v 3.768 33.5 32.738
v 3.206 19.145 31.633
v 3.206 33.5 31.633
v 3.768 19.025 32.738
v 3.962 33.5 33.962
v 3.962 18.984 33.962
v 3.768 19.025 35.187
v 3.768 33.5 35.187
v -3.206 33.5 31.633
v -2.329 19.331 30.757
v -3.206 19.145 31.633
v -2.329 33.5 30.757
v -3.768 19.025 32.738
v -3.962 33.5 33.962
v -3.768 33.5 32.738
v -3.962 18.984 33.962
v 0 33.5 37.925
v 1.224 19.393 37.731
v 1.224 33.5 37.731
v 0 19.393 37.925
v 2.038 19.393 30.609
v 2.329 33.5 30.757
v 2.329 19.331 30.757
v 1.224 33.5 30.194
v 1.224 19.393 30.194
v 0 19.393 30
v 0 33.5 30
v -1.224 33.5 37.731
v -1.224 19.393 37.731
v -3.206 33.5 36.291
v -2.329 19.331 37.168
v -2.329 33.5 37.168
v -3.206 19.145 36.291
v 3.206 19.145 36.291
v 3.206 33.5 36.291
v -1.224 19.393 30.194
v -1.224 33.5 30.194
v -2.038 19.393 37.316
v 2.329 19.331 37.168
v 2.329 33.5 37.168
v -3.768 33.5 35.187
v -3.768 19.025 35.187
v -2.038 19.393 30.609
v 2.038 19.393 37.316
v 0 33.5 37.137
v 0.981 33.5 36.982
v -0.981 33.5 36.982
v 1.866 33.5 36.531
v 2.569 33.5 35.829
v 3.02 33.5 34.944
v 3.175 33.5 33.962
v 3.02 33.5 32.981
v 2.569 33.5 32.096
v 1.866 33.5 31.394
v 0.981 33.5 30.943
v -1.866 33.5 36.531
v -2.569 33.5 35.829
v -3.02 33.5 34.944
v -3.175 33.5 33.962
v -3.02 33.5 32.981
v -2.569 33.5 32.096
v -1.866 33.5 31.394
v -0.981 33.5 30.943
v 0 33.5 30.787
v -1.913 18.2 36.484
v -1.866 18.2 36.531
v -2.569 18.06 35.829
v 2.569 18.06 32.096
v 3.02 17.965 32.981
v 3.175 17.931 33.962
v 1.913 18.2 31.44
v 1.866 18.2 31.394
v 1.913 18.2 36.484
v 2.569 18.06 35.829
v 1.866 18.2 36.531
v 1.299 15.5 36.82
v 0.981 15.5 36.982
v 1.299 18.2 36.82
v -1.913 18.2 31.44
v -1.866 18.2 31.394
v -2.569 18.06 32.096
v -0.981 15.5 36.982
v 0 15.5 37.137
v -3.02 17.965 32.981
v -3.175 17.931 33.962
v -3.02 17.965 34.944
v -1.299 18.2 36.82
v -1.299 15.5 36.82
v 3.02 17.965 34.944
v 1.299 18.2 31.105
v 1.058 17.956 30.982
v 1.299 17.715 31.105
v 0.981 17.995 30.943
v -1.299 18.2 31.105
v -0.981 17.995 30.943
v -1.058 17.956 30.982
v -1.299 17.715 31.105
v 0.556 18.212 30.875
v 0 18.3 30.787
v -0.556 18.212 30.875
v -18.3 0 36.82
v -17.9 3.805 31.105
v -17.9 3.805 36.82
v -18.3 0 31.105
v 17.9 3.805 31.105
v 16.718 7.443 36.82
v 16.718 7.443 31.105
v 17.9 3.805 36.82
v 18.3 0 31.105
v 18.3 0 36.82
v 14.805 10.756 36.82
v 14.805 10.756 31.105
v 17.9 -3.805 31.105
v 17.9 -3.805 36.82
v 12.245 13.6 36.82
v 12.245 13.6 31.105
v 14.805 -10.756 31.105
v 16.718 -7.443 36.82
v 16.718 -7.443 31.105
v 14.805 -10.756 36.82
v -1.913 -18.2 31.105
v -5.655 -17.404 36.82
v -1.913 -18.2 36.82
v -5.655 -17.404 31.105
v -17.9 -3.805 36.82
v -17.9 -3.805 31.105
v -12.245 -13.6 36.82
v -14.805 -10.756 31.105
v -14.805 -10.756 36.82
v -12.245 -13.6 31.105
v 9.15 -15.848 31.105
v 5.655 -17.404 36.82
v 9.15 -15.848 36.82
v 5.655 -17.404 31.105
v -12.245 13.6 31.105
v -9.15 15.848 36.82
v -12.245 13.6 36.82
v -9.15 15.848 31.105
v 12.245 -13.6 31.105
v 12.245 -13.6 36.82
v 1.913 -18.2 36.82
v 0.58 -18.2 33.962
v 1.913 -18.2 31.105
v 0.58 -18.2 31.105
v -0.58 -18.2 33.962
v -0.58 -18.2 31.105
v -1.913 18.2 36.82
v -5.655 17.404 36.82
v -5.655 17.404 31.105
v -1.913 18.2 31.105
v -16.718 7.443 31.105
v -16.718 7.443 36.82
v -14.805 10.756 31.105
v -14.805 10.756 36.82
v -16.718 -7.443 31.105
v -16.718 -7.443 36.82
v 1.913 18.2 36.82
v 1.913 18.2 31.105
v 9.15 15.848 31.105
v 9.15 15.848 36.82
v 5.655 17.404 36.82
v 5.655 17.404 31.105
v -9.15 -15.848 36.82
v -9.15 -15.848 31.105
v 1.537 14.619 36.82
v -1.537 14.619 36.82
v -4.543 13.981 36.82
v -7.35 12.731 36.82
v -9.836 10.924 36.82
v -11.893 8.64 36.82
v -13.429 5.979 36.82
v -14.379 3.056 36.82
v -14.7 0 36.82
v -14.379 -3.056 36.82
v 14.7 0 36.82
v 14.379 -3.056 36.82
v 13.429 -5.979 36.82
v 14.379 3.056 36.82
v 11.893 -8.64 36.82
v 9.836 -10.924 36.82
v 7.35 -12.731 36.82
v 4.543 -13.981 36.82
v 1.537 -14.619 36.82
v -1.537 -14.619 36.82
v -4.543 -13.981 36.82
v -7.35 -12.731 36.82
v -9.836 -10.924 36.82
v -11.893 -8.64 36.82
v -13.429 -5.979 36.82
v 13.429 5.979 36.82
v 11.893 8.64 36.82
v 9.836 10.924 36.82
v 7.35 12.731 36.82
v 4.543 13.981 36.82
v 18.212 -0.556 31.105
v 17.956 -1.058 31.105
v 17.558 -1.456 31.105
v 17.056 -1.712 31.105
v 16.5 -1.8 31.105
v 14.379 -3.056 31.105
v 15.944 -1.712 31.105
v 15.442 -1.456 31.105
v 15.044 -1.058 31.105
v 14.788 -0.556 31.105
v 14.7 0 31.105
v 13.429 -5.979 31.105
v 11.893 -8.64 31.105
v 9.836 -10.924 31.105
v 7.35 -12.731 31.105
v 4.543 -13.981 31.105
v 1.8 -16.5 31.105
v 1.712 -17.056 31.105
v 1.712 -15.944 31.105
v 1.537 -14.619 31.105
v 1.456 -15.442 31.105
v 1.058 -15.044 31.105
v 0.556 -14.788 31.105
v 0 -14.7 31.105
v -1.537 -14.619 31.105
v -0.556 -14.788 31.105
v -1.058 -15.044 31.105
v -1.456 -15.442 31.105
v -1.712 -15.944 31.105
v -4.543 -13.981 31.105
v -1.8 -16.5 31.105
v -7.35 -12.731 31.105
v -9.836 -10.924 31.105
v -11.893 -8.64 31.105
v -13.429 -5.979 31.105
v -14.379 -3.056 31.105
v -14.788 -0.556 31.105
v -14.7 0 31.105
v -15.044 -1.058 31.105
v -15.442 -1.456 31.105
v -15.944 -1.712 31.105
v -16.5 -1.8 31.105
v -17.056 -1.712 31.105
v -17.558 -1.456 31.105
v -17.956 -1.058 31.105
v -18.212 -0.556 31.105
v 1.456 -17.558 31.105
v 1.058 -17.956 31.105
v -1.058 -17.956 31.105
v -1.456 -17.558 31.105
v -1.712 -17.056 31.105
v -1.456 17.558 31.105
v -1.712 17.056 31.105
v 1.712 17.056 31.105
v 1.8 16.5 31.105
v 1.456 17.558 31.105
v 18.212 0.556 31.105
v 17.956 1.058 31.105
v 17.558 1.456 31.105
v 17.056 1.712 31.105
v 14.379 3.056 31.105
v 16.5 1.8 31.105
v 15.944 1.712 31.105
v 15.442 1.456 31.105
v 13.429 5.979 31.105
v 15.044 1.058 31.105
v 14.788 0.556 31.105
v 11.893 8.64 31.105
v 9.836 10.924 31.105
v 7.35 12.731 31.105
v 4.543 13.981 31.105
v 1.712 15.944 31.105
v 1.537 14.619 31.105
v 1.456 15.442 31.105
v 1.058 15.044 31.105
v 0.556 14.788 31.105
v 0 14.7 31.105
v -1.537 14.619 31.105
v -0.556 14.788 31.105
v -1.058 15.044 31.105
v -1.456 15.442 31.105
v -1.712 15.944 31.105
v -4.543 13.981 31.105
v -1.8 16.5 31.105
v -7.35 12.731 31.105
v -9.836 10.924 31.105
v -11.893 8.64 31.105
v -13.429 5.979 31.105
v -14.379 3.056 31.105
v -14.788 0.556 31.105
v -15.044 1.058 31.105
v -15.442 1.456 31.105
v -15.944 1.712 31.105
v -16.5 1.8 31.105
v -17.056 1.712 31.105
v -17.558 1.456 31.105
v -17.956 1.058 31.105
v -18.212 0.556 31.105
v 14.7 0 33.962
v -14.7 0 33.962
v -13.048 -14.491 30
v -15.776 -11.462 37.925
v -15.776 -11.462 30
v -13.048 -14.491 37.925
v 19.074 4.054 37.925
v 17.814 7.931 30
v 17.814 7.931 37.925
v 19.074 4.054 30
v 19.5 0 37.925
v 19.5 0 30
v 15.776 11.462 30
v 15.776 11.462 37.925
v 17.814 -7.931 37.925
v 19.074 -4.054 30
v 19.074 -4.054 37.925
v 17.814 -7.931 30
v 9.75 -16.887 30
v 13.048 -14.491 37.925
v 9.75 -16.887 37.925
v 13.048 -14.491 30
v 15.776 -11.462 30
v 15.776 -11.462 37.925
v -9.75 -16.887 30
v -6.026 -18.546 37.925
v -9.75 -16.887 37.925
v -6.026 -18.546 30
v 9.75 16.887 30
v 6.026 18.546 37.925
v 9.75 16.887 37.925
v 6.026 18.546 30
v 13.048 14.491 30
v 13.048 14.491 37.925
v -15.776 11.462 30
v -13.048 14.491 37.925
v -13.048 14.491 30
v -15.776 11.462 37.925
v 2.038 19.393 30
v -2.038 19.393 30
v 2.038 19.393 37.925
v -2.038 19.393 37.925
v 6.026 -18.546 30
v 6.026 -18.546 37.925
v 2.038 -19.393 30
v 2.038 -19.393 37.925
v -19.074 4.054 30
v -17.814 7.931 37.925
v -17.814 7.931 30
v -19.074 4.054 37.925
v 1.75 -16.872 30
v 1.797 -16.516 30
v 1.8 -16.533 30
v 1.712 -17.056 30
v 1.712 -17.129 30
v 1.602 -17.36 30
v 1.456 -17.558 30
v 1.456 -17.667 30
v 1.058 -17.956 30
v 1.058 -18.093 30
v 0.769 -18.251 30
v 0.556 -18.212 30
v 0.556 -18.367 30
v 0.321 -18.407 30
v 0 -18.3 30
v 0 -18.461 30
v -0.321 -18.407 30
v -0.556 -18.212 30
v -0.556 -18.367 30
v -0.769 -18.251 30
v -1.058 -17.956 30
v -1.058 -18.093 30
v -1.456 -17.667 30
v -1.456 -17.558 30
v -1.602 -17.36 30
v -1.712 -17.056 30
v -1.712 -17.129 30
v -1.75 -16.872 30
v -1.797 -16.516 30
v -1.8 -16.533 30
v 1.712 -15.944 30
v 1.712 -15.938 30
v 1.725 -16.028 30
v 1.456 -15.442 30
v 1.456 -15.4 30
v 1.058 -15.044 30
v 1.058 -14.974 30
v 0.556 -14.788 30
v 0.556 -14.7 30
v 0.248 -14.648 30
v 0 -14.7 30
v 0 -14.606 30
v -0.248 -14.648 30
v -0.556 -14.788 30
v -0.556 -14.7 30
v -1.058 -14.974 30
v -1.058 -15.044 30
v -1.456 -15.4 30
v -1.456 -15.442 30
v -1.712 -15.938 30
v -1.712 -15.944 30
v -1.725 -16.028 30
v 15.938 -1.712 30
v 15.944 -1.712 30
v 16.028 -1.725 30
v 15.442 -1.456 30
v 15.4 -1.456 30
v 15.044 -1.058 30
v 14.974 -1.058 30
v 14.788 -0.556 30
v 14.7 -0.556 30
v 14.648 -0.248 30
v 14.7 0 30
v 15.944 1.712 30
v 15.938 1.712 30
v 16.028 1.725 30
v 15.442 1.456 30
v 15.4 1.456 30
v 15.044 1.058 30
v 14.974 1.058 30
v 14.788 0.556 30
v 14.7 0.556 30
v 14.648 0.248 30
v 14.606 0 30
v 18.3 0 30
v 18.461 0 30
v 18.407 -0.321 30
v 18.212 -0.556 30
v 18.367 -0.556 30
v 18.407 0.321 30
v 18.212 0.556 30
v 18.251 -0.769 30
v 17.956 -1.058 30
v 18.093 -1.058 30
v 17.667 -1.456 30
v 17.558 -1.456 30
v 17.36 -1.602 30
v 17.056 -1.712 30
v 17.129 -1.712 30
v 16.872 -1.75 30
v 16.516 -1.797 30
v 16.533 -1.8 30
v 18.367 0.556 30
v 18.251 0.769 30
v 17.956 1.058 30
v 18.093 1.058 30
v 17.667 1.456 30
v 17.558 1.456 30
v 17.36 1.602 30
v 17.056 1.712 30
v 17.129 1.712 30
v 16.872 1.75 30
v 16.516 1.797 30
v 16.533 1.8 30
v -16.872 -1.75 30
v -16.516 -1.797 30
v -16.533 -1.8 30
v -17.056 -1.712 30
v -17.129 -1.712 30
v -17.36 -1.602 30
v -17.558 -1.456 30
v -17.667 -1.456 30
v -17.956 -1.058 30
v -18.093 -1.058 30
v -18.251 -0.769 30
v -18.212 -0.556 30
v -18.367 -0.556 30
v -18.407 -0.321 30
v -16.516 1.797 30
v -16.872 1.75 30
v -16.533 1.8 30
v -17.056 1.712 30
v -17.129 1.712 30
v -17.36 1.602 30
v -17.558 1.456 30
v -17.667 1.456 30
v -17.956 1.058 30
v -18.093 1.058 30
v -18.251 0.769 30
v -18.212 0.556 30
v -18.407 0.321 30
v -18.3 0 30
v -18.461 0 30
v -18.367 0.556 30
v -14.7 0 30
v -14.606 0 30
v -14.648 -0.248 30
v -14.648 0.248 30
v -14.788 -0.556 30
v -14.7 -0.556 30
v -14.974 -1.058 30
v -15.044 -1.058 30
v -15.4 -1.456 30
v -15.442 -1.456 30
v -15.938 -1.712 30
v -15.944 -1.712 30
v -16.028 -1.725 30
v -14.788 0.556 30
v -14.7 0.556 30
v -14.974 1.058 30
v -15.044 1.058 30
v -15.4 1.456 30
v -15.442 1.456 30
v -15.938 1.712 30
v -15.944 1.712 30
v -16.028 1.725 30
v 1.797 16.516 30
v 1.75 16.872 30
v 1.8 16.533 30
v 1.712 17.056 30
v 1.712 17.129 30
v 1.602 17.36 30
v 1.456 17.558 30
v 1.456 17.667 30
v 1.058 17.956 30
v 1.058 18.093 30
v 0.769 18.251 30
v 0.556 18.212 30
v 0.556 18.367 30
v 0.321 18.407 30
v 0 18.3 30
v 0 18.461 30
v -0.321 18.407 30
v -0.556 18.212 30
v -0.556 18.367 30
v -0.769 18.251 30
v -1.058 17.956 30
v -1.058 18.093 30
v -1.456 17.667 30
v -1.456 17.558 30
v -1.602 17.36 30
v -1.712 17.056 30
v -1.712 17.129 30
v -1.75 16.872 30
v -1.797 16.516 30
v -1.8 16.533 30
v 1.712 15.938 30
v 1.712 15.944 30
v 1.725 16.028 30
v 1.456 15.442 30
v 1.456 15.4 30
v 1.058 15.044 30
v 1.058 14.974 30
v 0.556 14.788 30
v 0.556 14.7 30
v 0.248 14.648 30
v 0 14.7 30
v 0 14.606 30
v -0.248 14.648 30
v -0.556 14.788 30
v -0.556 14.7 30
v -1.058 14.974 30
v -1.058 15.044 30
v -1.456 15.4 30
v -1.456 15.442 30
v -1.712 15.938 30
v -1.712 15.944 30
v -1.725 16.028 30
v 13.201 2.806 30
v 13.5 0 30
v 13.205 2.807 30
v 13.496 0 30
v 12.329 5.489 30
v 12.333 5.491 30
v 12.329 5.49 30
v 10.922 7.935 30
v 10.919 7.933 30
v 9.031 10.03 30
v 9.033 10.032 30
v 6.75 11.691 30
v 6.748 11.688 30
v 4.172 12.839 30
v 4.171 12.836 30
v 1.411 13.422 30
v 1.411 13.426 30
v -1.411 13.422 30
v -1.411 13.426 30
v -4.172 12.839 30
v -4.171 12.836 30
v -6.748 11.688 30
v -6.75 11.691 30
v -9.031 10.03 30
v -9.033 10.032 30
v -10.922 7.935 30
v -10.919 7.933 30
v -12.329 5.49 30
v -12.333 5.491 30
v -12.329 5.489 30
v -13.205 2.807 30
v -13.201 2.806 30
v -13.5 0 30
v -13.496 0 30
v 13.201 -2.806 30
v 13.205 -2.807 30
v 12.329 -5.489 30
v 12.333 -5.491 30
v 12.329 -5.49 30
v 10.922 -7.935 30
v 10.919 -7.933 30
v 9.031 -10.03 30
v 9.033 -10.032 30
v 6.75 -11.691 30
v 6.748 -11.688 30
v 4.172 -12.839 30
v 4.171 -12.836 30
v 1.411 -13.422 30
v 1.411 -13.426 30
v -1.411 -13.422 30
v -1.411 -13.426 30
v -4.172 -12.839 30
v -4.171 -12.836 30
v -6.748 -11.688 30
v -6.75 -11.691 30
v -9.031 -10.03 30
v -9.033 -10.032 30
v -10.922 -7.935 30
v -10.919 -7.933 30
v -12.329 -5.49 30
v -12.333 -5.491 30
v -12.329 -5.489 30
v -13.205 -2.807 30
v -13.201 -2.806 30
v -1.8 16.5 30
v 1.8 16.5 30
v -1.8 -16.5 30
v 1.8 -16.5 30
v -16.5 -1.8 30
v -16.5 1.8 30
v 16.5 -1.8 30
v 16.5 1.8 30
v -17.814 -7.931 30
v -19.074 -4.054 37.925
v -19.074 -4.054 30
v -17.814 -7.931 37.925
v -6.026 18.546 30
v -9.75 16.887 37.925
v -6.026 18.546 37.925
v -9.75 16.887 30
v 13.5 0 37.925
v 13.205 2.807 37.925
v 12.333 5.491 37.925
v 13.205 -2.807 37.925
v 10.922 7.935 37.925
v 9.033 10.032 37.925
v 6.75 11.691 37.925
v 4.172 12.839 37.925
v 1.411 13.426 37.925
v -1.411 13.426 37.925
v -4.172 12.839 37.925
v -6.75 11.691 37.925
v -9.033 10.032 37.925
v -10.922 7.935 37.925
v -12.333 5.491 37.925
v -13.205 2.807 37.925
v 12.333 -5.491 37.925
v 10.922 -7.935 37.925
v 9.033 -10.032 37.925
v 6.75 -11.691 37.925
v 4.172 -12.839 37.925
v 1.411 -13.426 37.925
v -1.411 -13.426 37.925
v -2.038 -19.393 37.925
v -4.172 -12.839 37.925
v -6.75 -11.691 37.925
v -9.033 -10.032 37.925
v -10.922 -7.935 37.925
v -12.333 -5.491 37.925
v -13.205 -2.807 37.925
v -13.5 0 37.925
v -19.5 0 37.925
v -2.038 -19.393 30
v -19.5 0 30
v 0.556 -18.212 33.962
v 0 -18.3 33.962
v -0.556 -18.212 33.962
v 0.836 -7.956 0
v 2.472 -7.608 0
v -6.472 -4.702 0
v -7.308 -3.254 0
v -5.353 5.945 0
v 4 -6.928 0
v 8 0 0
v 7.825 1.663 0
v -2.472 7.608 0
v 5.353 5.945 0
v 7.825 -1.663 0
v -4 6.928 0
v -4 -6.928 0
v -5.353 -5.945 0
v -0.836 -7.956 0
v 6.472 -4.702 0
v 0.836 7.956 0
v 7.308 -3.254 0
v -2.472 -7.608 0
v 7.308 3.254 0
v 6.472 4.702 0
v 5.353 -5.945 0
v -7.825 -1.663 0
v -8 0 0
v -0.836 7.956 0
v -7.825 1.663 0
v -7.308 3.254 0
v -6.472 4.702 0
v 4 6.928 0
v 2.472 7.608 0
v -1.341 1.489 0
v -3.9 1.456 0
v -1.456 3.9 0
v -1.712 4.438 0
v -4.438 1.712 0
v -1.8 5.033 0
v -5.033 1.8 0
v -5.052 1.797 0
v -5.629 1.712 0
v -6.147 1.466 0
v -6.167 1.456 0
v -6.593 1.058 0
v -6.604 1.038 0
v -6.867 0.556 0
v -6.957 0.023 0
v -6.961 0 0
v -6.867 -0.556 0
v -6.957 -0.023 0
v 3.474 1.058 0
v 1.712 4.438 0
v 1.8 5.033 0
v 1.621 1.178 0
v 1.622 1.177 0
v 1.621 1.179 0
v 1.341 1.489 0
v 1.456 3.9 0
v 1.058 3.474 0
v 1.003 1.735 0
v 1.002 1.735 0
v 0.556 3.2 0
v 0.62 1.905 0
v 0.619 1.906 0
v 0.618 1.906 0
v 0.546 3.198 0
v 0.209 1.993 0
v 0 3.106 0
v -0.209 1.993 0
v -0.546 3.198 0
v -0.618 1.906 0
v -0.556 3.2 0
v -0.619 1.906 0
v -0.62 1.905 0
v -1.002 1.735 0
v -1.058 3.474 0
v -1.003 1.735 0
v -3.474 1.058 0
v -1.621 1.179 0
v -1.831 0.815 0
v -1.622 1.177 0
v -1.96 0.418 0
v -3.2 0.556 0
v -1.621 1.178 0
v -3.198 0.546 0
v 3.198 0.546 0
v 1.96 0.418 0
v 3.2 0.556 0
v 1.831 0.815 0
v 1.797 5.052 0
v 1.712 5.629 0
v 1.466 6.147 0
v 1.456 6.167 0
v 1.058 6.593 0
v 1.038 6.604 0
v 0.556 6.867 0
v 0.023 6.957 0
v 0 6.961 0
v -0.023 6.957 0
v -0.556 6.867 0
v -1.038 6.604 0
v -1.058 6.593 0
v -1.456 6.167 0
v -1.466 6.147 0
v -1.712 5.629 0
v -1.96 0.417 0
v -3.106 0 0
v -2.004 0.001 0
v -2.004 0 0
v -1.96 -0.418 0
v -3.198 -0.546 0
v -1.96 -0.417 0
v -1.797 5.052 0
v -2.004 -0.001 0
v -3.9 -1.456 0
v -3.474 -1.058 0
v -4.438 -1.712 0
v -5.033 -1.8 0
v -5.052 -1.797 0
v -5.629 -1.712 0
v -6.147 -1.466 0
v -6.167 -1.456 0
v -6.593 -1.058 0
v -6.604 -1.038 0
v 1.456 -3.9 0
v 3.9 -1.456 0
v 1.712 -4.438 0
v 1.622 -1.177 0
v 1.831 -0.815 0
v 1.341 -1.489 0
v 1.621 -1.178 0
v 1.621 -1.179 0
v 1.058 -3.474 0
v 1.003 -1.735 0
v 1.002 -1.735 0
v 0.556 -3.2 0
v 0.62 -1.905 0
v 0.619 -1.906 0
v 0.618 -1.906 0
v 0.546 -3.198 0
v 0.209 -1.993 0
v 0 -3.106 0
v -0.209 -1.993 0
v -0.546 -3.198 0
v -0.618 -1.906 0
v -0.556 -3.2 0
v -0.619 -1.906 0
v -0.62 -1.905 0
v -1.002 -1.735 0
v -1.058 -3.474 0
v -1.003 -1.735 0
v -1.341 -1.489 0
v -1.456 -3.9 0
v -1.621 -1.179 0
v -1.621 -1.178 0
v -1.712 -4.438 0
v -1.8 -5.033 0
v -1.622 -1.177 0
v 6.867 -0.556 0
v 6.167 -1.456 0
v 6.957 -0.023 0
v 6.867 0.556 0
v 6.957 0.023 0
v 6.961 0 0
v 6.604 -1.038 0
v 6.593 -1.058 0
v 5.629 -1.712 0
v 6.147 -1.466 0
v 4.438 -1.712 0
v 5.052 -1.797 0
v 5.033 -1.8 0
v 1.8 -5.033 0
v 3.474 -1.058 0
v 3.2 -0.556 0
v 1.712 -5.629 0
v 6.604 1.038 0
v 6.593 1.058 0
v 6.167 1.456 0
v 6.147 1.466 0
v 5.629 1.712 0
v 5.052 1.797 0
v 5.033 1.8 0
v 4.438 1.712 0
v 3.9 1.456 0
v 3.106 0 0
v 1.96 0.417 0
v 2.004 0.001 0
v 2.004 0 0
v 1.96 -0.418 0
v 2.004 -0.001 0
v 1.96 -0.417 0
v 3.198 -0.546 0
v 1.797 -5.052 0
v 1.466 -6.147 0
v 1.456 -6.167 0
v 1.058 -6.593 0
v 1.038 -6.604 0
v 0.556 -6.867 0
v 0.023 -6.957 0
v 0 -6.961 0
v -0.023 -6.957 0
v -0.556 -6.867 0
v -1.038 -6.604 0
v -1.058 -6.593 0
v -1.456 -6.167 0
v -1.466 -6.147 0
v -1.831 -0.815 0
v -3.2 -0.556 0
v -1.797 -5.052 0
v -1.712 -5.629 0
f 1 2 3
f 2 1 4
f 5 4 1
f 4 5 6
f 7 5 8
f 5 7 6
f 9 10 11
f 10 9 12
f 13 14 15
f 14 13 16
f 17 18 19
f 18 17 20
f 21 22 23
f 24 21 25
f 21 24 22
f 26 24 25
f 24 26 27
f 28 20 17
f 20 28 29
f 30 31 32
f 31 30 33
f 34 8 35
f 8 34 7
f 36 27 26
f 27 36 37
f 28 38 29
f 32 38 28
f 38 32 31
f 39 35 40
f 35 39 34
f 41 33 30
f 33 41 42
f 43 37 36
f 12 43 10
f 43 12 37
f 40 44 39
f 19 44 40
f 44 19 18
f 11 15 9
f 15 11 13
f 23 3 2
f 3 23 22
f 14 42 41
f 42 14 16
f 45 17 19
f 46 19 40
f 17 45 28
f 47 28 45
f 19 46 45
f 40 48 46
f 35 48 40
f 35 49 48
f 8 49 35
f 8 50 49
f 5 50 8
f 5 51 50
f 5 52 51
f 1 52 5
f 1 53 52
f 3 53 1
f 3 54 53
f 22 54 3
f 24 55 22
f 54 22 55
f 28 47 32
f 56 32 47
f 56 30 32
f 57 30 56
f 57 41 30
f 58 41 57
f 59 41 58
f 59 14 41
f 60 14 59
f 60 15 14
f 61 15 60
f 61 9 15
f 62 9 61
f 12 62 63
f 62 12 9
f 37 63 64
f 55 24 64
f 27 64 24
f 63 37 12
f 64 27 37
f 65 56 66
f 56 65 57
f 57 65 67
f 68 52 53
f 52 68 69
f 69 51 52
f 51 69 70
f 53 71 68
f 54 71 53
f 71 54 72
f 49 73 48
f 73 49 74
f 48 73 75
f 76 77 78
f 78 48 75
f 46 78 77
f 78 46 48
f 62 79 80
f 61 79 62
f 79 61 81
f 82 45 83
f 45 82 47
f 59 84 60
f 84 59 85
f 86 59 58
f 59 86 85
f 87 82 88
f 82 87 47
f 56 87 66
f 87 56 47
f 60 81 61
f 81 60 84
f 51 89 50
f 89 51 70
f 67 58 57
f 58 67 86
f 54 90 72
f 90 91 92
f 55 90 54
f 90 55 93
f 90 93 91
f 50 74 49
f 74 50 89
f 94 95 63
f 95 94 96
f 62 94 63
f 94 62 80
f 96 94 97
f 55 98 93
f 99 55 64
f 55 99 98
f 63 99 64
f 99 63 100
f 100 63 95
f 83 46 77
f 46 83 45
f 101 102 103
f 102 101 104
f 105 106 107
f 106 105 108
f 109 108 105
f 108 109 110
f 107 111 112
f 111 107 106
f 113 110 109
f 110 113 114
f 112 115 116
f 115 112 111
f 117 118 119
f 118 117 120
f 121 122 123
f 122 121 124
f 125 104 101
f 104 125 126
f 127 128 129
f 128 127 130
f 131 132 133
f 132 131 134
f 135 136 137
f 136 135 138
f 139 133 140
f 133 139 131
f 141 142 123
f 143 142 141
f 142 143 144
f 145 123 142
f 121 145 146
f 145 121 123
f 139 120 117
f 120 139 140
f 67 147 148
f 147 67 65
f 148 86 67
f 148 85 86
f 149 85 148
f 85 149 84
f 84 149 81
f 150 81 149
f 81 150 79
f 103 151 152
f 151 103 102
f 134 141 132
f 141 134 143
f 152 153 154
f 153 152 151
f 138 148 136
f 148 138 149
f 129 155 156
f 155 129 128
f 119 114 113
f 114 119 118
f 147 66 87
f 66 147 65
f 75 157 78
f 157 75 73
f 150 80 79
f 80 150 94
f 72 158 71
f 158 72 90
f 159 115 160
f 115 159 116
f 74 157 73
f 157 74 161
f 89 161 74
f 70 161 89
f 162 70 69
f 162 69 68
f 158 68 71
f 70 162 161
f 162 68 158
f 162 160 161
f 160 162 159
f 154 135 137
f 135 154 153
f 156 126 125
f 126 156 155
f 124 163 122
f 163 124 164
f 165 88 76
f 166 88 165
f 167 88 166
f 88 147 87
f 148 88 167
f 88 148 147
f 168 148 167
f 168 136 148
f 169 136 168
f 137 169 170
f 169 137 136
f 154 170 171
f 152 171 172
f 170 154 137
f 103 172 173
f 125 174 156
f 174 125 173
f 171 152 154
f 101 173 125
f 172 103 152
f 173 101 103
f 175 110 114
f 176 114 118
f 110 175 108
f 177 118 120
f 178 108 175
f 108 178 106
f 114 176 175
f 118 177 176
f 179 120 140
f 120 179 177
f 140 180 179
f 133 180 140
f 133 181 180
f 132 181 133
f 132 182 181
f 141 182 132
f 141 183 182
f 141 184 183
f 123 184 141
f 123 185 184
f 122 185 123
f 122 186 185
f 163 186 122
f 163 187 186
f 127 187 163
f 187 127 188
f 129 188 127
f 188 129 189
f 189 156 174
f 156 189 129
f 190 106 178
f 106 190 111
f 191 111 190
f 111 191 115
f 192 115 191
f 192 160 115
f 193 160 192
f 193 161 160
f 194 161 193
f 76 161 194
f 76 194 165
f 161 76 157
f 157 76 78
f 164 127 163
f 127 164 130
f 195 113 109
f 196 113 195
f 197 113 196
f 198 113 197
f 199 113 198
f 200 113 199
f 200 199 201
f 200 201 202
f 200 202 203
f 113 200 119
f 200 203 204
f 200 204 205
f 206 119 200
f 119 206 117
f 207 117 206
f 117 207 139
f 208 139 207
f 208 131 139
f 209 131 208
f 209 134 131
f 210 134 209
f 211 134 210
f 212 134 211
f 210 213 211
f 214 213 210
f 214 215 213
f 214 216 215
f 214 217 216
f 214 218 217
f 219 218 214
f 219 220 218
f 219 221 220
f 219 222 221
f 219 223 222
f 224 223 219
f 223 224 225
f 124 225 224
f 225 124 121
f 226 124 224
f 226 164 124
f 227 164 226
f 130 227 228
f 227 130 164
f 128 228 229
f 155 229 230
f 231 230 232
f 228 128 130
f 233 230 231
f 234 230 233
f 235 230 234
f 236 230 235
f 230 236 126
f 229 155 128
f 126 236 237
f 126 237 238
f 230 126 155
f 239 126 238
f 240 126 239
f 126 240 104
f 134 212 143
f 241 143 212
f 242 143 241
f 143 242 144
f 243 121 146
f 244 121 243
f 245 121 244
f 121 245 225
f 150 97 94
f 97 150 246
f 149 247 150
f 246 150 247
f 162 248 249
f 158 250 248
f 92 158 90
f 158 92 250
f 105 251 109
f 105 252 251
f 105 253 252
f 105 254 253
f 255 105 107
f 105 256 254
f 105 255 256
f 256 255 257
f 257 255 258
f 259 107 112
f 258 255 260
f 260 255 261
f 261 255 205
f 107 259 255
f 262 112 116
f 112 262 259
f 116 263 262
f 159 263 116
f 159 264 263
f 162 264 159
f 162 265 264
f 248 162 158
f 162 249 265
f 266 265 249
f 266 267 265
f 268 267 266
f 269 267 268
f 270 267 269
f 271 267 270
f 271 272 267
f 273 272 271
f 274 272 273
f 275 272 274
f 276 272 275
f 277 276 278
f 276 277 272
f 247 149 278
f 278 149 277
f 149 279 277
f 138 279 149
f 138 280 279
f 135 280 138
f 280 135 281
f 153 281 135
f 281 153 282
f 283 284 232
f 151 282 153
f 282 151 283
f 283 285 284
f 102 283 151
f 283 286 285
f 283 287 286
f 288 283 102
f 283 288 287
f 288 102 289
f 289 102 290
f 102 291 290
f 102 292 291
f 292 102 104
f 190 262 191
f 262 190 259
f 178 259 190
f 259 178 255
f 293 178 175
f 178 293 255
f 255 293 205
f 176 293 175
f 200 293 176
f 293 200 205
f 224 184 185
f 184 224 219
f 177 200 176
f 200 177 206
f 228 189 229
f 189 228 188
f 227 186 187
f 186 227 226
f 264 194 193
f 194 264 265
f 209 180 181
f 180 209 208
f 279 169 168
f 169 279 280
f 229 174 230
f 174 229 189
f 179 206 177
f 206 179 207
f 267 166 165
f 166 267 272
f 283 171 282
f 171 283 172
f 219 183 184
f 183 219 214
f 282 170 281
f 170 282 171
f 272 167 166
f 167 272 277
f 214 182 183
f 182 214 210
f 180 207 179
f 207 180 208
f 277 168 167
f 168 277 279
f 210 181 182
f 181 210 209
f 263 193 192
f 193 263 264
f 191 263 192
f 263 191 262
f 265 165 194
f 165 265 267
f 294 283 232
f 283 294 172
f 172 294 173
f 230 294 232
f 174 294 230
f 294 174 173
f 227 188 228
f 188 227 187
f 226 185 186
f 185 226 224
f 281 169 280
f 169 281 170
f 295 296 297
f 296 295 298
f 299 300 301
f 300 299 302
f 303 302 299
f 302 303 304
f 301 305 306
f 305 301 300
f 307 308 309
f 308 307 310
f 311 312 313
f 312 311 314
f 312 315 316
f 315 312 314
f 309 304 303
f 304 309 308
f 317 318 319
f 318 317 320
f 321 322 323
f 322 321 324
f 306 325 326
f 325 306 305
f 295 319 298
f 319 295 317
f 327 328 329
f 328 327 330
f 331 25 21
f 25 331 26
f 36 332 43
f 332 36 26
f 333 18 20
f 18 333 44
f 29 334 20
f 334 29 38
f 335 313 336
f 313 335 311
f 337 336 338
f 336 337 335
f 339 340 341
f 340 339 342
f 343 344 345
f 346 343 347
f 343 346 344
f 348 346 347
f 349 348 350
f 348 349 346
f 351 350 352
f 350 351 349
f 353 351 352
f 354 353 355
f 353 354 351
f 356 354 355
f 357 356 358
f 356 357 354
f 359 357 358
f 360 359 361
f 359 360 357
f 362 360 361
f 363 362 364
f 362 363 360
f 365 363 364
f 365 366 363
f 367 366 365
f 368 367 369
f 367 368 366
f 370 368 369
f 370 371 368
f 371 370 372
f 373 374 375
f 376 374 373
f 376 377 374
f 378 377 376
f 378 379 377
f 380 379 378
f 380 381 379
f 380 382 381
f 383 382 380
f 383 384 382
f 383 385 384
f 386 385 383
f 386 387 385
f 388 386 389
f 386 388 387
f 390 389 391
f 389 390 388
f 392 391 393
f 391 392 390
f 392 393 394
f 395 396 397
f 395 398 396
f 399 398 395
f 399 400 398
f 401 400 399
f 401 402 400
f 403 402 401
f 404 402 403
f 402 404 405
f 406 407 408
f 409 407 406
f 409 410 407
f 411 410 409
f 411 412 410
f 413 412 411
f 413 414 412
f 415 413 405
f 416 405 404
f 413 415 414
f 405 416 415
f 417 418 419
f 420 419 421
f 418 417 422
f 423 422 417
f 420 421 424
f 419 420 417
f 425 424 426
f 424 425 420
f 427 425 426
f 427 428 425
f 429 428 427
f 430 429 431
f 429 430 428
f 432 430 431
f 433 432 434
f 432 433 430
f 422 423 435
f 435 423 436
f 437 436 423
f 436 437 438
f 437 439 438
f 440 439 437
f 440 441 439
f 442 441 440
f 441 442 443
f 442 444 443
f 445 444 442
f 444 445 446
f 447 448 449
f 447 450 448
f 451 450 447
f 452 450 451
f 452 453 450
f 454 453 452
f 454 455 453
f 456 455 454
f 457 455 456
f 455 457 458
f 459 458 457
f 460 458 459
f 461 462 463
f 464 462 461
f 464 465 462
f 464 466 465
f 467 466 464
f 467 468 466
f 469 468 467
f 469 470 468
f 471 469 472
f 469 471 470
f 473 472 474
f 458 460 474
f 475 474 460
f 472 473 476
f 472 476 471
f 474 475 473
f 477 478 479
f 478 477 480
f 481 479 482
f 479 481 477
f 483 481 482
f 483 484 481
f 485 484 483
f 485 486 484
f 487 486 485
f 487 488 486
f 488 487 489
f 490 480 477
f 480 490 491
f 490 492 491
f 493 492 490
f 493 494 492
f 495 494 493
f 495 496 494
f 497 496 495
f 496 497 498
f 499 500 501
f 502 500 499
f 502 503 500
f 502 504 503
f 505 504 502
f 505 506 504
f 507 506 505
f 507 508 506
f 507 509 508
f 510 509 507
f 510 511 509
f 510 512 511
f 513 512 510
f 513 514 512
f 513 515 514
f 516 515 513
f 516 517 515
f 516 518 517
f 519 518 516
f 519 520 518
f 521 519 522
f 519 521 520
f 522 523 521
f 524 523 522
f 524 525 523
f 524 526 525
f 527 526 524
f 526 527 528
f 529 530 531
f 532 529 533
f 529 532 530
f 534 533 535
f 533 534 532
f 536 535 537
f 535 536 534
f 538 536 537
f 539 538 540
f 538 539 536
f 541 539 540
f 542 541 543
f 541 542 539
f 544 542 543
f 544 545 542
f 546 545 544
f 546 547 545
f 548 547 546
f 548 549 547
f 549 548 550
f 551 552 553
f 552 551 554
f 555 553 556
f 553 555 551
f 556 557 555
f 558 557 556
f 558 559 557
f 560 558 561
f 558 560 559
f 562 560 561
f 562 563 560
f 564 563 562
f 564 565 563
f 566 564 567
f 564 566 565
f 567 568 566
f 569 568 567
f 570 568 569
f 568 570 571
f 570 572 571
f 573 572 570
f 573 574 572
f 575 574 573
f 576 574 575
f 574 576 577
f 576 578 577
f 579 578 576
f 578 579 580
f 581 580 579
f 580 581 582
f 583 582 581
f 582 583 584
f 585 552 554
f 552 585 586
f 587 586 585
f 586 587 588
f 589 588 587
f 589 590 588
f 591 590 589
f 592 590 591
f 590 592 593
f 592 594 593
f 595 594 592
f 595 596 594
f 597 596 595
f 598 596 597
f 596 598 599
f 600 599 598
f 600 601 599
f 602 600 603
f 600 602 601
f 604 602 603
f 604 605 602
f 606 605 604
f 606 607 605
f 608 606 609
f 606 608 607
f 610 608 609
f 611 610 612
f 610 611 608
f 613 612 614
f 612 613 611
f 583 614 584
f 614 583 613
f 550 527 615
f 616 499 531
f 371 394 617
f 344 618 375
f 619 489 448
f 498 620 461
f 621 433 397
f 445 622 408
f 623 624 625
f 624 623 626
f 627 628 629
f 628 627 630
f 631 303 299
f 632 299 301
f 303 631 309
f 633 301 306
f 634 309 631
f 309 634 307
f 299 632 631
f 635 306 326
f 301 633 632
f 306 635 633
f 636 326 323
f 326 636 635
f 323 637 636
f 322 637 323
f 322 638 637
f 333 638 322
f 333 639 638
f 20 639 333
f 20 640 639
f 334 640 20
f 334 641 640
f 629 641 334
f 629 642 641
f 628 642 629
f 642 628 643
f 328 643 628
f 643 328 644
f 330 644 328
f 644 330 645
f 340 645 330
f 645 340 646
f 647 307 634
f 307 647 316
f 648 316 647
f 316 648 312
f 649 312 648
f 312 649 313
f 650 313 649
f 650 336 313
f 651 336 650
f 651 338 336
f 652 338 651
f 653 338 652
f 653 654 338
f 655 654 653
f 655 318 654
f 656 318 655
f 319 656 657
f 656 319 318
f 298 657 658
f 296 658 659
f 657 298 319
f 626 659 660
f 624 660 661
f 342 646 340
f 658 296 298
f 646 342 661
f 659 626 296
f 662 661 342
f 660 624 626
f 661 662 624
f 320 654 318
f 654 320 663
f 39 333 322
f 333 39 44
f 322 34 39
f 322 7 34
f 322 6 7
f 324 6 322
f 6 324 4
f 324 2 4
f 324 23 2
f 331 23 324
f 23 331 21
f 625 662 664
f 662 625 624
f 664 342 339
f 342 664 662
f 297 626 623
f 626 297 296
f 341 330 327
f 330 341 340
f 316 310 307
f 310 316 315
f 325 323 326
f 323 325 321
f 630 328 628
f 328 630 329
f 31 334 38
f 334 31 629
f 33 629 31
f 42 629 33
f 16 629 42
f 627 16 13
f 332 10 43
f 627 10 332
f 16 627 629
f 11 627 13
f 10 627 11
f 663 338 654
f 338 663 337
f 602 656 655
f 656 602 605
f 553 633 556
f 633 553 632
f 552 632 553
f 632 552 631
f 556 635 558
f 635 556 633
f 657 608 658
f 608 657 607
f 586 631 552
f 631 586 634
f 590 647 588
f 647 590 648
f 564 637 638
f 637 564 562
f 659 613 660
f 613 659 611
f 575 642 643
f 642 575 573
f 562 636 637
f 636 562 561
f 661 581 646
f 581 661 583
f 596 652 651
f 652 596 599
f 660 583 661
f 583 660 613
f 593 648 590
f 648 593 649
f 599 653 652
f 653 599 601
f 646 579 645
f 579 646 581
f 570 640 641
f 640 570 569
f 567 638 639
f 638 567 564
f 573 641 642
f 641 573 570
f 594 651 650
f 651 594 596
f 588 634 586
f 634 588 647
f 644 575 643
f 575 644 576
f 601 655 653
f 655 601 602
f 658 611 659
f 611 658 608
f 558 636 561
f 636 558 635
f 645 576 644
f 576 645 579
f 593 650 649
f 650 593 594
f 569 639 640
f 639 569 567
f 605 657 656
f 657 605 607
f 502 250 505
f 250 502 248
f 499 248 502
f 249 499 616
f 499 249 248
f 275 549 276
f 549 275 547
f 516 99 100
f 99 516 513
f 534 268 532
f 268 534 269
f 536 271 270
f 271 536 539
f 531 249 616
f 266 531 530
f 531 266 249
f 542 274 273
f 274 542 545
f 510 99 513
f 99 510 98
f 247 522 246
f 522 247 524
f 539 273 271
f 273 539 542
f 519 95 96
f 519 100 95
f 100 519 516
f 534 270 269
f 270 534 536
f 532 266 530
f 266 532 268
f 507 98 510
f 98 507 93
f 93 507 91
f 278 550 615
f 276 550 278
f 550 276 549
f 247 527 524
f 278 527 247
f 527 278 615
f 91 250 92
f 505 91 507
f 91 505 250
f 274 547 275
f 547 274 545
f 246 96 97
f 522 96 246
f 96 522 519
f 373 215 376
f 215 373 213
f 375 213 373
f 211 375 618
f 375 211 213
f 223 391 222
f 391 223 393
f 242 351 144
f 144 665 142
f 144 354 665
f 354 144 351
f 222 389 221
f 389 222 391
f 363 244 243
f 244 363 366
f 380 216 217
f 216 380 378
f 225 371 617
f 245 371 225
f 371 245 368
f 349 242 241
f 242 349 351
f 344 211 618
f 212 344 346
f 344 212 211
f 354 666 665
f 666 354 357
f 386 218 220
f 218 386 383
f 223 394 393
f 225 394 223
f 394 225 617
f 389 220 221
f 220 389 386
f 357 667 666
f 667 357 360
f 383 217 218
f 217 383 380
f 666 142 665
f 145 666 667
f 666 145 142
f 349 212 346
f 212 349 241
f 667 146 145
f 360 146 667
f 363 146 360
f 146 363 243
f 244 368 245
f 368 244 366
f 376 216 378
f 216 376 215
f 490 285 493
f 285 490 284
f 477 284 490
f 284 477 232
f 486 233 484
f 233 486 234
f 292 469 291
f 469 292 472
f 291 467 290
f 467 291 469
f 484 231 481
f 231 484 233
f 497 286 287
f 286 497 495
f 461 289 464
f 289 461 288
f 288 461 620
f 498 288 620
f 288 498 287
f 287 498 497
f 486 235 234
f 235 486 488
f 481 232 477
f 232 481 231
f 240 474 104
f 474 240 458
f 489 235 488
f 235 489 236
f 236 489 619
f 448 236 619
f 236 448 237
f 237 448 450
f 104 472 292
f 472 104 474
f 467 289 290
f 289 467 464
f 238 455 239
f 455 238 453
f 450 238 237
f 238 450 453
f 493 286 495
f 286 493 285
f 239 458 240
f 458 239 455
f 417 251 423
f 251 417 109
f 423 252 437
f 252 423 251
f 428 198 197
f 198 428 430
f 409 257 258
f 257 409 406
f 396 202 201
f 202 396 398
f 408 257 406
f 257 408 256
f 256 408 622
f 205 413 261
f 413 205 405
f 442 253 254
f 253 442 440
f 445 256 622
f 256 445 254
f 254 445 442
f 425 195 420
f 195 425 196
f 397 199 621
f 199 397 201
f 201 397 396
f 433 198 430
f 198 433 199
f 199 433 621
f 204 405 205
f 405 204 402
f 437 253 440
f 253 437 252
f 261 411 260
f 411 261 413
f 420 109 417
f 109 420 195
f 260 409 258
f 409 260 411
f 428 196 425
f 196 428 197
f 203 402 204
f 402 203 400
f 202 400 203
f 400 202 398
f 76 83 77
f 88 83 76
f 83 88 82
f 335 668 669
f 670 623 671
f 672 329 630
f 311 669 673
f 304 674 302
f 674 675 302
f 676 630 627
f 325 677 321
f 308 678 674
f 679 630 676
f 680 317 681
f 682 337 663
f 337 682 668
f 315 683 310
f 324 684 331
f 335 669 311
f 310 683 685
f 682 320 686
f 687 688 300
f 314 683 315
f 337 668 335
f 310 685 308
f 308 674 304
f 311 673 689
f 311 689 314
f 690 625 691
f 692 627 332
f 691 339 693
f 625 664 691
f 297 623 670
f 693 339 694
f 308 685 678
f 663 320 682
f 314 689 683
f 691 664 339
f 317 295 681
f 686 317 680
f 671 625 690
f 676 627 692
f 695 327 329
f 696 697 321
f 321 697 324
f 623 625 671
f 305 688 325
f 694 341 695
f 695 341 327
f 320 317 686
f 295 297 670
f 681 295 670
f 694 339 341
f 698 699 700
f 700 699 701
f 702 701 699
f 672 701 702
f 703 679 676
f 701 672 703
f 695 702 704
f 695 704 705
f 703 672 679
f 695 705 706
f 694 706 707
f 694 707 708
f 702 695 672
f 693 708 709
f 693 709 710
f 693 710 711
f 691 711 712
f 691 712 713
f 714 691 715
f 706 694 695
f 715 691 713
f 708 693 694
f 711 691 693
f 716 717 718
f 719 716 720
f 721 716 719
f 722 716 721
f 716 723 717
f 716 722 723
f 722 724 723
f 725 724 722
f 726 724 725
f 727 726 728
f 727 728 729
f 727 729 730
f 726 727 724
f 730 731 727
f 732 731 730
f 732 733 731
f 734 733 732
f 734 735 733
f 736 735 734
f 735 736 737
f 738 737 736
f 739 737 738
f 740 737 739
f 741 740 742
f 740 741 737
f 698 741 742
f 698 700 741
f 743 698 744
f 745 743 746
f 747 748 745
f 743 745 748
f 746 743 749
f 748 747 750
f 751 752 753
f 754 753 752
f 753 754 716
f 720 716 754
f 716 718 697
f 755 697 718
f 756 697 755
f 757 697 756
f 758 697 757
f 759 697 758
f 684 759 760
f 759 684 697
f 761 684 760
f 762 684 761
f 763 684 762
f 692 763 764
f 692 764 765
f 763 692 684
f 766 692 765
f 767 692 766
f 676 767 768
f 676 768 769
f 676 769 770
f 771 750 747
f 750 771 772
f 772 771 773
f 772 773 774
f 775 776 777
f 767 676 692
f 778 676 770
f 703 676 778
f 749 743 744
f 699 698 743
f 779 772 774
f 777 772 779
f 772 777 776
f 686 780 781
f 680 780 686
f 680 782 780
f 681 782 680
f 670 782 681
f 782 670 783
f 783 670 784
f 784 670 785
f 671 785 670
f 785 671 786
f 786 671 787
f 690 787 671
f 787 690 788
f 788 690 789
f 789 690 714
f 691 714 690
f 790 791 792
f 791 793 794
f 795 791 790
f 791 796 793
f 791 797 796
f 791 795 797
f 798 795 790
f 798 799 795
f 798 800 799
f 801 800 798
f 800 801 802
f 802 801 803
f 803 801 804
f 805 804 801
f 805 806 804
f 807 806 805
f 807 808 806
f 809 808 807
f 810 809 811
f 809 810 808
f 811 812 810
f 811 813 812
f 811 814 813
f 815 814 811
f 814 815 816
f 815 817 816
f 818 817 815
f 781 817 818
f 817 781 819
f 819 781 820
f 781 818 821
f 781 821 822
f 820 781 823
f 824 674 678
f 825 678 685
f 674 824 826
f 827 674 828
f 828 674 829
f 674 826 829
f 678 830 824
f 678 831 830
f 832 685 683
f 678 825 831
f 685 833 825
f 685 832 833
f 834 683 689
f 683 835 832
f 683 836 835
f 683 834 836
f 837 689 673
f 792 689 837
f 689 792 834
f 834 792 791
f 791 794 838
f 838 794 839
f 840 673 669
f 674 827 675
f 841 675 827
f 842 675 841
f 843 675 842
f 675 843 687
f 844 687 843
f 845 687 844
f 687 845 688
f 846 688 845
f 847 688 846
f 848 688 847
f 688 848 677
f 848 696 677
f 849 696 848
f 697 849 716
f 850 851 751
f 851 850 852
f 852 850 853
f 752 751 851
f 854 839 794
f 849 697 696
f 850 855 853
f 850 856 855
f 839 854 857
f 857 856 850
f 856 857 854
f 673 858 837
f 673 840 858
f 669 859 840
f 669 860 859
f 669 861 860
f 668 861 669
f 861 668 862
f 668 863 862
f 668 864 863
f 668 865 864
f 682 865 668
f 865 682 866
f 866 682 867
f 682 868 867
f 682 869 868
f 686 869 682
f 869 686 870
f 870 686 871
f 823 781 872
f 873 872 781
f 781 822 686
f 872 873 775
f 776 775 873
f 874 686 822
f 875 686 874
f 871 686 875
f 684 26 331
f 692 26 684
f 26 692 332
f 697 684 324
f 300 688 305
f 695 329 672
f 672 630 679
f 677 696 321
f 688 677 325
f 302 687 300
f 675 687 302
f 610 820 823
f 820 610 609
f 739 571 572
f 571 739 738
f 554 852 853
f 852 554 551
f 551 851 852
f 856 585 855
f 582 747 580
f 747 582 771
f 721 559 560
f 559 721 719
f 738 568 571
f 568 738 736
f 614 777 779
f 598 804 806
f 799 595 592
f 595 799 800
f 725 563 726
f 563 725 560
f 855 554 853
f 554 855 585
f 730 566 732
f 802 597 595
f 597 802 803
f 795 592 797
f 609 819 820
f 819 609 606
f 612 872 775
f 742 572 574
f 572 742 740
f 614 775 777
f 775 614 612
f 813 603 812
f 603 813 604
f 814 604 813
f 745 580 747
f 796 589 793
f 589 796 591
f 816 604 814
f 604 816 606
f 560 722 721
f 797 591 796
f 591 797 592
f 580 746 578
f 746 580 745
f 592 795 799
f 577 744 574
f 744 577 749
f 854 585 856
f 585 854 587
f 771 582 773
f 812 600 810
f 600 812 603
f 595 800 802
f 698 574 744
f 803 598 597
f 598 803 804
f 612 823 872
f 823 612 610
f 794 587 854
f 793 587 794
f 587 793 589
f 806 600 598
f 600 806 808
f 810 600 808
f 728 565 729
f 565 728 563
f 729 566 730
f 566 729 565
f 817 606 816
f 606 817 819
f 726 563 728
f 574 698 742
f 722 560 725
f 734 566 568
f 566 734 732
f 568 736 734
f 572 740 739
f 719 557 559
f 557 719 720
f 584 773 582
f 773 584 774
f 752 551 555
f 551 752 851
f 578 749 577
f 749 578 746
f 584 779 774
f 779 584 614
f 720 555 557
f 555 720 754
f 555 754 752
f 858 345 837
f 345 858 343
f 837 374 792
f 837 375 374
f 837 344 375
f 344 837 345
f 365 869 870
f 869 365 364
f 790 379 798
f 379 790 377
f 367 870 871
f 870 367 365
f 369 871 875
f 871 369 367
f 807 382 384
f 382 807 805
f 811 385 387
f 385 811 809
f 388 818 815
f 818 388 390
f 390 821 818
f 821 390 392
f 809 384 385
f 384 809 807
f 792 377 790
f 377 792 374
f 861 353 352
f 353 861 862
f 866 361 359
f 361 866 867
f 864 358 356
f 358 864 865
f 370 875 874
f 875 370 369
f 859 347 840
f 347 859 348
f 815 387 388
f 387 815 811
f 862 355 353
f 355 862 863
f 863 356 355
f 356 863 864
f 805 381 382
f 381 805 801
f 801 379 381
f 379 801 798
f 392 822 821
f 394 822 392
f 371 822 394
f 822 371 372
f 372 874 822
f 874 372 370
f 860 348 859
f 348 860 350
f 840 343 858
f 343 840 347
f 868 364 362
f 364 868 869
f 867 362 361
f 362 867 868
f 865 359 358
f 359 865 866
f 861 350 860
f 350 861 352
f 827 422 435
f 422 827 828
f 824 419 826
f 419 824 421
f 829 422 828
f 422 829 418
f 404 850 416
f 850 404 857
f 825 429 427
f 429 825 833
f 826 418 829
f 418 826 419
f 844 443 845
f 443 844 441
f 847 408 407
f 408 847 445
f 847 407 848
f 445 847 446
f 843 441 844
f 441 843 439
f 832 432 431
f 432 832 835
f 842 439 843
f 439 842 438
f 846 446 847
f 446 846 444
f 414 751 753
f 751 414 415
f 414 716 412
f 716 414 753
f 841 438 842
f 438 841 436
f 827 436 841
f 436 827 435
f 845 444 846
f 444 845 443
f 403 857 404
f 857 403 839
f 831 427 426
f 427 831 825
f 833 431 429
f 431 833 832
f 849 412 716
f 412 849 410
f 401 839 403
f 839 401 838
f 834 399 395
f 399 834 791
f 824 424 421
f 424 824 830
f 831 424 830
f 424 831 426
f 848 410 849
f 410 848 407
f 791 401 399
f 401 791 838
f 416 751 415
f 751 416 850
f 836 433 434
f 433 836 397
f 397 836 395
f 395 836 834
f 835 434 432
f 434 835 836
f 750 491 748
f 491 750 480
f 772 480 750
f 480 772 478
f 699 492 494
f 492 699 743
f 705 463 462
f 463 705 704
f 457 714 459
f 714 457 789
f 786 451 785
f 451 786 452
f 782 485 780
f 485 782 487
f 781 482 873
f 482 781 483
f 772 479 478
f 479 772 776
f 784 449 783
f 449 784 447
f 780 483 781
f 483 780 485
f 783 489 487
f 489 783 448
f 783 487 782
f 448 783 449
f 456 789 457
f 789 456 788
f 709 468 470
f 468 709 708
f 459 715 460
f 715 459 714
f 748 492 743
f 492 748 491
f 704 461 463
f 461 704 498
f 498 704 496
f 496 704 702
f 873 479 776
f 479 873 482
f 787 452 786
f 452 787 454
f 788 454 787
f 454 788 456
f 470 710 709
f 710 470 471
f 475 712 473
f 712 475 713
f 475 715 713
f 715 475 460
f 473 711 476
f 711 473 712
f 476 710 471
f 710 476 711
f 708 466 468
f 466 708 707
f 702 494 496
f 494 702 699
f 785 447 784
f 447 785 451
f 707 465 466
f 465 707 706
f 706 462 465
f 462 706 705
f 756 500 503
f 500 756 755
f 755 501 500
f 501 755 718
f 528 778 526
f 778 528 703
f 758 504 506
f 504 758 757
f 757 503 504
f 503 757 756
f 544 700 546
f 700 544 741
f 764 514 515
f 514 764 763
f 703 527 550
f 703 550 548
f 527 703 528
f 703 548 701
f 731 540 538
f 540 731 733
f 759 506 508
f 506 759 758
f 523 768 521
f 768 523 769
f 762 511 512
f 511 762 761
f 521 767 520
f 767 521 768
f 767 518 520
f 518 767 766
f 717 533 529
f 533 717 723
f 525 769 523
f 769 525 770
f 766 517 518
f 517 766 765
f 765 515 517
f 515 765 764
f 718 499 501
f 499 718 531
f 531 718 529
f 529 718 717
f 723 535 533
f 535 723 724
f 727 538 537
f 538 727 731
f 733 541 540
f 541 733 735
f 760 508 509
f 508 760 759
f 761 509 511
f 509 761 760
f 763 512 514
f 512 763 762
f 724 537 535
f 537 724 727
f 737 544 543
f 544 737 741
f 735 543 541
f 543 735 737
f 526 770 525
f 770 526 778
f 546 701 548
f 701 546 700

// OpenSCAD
//upper ring around the laser lens 
airNozzleLaserMountThickness=6; //[5:8] 
// how big around the laser eye diameter is [13.5 is a k40 on a davinci)
airNozzleLaserMountRadius=13.5; // [13.5:20]
//how long this mount should be to sit flush should be at least double the size of the interior ring
airNozzleLaserMountLength=7.9248;
 //how big around the hole in the middle will be (NO AIR)
airNozzleTipMountRadius=2; // [2:8]
// size of the air tube on the side for mounting the hose
airNozzleAirTubeRadius=3.9624; 
// how round the air tube is
airNozzleAirTubeSides=20;  
//the length of the air tube for the hose connection 
airNozzleAirTubeLength=15;  // [10:20] 
//how long the down spout tube is (less = more angled tip)
airNozzleTubeLHeight=30; // [25:50] 
//how thick the down spout is
airNozzleWallThickness=6; // [5:8] 
// how big the interior tubes are, larger = more air flow (you MUST leave more then 1 mm between the size of the walls (airNozzleWallThickness and the size of the tubing (airInteriorTubeRadius) otherwise you will have holes in the walls
airInteriorTubeRadius=1.8; 
// how big the interior tubes are, larger = more air flow. This is the air inlet and upper air tubes.
airNozzleInteriorTubeRadius=3.175; 
airNozzleOffset=airNozzleWallThickness-airNozzleInteriorTubeRadius;
angle=atan((airNozzleLaserMountRadius-airNozzleTipMountRadius)/airNozzleTubeLHeight);
airNozzleLaserMountLengthAirHalfHeight=airNozzleLaserMountLength/2;

module Nozzle(){
    
    echo("angle=", angle);    
    union(){
            
        difference(){ // air nozzle
            rotate([-90, 0,0])
            translate([0, -airNozzleTubeLHeight - (airNozzleLaserMountLength /2),(airNozzleAirTubeLength /2 ) + airNozzleLaserMountRadius + airNozzleLaserMountThickness - 1])         
            cylinder(h = airNozzleAirTubeLength , r1 = airNozzleAirTubeRadius, r2 = airNozzleAirTubeRadius, center = true, $fn = airNozzleAirTubeSides);
            
            rotate([-90, 0,0]) // outer tube airhole
            translate([0, -airNozzleTubeLHeight - (airNozzleLaserMountLength /2),(airNozzleAirTubeLength /2 ) + airNozzleLaserMountRadius + airNozzleLaserMountThickness - 1]) 
            cylinder(h = airNozzleAirTubeLength  + 0.02, r1 = airNozzleInteriorTubeRadius, r2 = airNozzleInteriorTubeRadius, center = true, $fn = airNozzleAirTubeSides);
            };   

        difference(){  // laser mount 
            
            translate([0, 0,airNozzleTubeLHeight + (airNozzleLaserMountLength /2)])         
            cylinder(h = airNozzleLaserMountLength, r1 = airNozzleLaserMountRadius + airNozzleLaserMountThickness, r2 = airNozzleLaserMountRadius + airNozzleLaserMountThickness, center = true);
            
            
            translate([0, 0,airNozzleTubeLHeight+ (airNozzleLaserMountLength /2)])         
            cylinder(h = airNozzleLaserMountLength + 0.02, r1 = airNozzleLaserMountRadius + airNozzleLaserMountThickness - airNozzleLaserMountThickness, r2 = airNozzleLaserMountRadius + airNozzleLaserMountThickness - airNozzleLaserMountThickness, center = true);
            
            
            
            rotate([-90, 0,0]) // create air hole 
            translate([0, -airNozzleTubeLHeight - (airNozzleLaserMountLength /2),airNozzleLaserMountRadius + airNozzleLaserMountThickness+ (airNozzleAirTubeLength /2 )])
            cylinder(h = airNozzleAirTubeLength  + 0.02, r1 = airInteriorTubeRadius, r2 = airInteriorTubeRadius, center = true, $fn = airNozzleAirTubeSides);
                    
            
            difference(){ // inner air tube ring
                
                translate([0, 0, airNozzleTubeLHeight + (airNozzleLaserMountLength /2) ]) cylinder(h = airNozzleInteriorTubeRadius * 1.8, r1 = airNozzleLaserMountRadius + ( airNozzleLaserMountThickness  * .80 ) , r2 = airNozzleLaserMountRadius + (airNozzleLaserMountThickness * .80 ), center = true);
                
                
                translate([0, 0, airNozzleTubeLHeight + (airNozzleLaserMountLength /2) ]) cylinder(h = (airNozzleInteriorTubeRadius  * 1.8 )+ 0.02, r1 = airNozzleLaserMountRadius + ( airNozzleLaserMountThickness  * .20 ) , r2 = airNozzleLaserMountRadius + ( airNozzleLaserMountThickness  * .20 ), center = true);
        
                
                };
                // upper air tube 1
                    translate([0, airNozzleLaserMountRadius + (airNozzleLaserMountThickness * 0.50) ,airNozzleTubeLHeight])
                    cylinder(h = airNozzleLaserMountLength, r1 = airInteriorTubeRadius, r2 = airInteriorTubeRadius, center = true, $fn = airNozzleAirTubeSides);
            
             // upper air tube 2
                translate([0, -airNozzleLaserMountRadius- (airNozzleLaserMountThickness * 0.50),airNozzleTubeLHeight])
                cylinder(h = airNozzleLaserMountLength, r1 = airInteriorTubeRadius, r2 = airInteriorTubeRadius, center = true, $fn = airNozzleAirTubeSides);
            
            // inner air tube 3
                translate([-airNozzleLaserMountRadius -  (airNozzleLaserMountThickness * 0.50), 0,airNozzleTubeLHeight])
                cylinder(h = airNozzleLaserMountLength, r1 = airInteriorTubeRadius, r2 = airInteriorTubeRadius, center = true, $fn = airNozzleAirTubeSides);
                        // upper air tube 4
                translate([airNozzleLaserMountRadius  + (airNozzleLaserMountThickness * 0.50) , 0, airNozzleTubeLHeight   ])
                cylinder(h = airNozzleLaserMountLength , r1 = airInteriorTubeRadius, r2 = airInteriorTubeRadius, center = true, $fn = airNozzleAirTubeSides);

                
                rotate([-90, 0,0]) // outer tube airhole to inner connection
            translate([0, -airNozzleTubeLHeight - (airNozzleLaserMountLength /2),(airNozzleAirTubeLength /2 ) + airNozzleLaserMountRadius + airNozzleLaserMountThickness - 4])   
            cylinder(h = airNozzleAirTubeLength, r1 = airNozzleInteriorTubeRadius, r2 = airNozzleInteriorTubeRadius, center = true, $fn = airNozzleAirTubeSides);

               
           };
           
    
           difference(){        // down spout air hole
   
        
               translate([0, 0, airNozzleTubeLHeight/2 ])
               cylinder(h = airNozzleTubeLHeight, r1 = airNozzleTipMountRadius + airNozzleWallThickness, r2 = airNozzleLaserMountRadius + airNozzleWallThickness, center = true);
               
               translate([0, 0,airNozzleTubeLHeight/2])
               cylinder(h = airNozzleTubeLHeight + 0.02, r1 = airNozzleTipMountRadius + airNozzleWallThickness - airNozzleWallThickness, r2 = airNozzleLaserMountRadius + airNozzleWallThickness - airNozzleWallThickness, center = true);
           
            difference(){ //tubes inside the down spout
                // lower air tube 1 back side
            //rotate([angle, 0,0])
            //translate([0, -airNozzleWallThickness,airNozzleTubeLHeight])         
            //cylinder(h = airNozzleAirTubeLength * 2, r1 = airNozzleAirTubeRadius, r2 = airNozzleAirTubeRadius, center = true, $fn = airNozzleAirTubeSides);
            
            // lower inner air tube 1 back side
            rotate([angle, 0,0])
            translate([0, -airNozzleTipMountRadius - (airNozzleWallThickness * 0.45),airNozzleTubeLHeight])
            cylinder(h = airNozzleTubeLHeight * 2  + 0.02, r1 = airInteriorTubeRadius, r2 = airInteriorTubeRadius, center = true, $fn = airNozzleAirTubeSides);
            };   
            
            difference(){ // lower air tube 2 left side
                //rotate([0, angle,0])
                //translate([airNozzleWallThickness, 0,airNozzleTubeLHeight])
            //cylinder(h = airNozzleAirTubeLength * 2 , r1 = airNozzleAirTubeRadius, r2 = airNozzleAirTubeRadius, center = true, $fn = airNozzleAirTubeSides);
            
            // lower inner air tube 2 left side
                rotate([0, angle,0])
                translate([airNozzleTipMountRadius + (airNozzleWallThickness * 0.45), 0,airNozzleTubeLHeight])
            cylinder(h = airNozzleTubeLHeight * 2  + 0.02, r1 = airInteriorTubeRadius, r2 = airInteriorTubeRadius, center = true, $fn = airNozzleAirTubeSides);
            }; 
            
            difference(){ // lower air tube 3 right side
                //rotate([0, -angle,0])
            //translate([-airNozzleWallThickness, 0,airNozzleTubeLHeight])         
            //cylinder(h = airNozzleAirTubeLength * 2 , r1 = airNozzleAirTubeRadius, r2 = airNozzleAirTubeRadius, center = true, $fn = airNozzleAirTubeSides);
            
            // lower inner air tube 3 right side
                rotate([0, -angle,0])
            translate([-airNozzleTipMountRadius - (airNozzleWallThickness * 0.45), 0,airNozzleTubeLHeight])
            cylinder(h = airNozzleTubeLHeight * 2  + 0.02, r1 = airInteriorTubeRadius, r2 = airInteriorTubeRadius, center = true, $fn = airNozzleAirTubeSides);
            }; 
            
            difference(){ // lower air tube 4  front side
                //rotate([-angle, 0,0])
                //translate([0, airNozzleWallThickness,airNozzleTubeLHeight]) 
                   
            //cylinder(h = airNozzleAirTubeLength * 2 , r1 = airNozzleAirTubeRadius, r2 = airNozzleAirTubeRadius, center = true, $fn = airNozzleAirTubeSides);
                        // lower air tube 4 front side
                rotate([-angle, 0,0])
                translate([0, airNozzleTipMountRadius + (airNozzleWallThickness * 0.45),airNozzleTubeLHeight]) 
            //translate([airNozzleTubeLHeight + (airNozzleLaserMountLength /2), 0,airNozzleTubeLHeight/2])
            cylinder(h = airNozzleTubeLHeight * 2  + 0.02, r1 = airInteriorTubeRadius, r2 = airInteriorTubeRadius, center = true, $fn = airNozzleAirTubeSides);

            };     

    
    
    };

};
};


Nozzle();
